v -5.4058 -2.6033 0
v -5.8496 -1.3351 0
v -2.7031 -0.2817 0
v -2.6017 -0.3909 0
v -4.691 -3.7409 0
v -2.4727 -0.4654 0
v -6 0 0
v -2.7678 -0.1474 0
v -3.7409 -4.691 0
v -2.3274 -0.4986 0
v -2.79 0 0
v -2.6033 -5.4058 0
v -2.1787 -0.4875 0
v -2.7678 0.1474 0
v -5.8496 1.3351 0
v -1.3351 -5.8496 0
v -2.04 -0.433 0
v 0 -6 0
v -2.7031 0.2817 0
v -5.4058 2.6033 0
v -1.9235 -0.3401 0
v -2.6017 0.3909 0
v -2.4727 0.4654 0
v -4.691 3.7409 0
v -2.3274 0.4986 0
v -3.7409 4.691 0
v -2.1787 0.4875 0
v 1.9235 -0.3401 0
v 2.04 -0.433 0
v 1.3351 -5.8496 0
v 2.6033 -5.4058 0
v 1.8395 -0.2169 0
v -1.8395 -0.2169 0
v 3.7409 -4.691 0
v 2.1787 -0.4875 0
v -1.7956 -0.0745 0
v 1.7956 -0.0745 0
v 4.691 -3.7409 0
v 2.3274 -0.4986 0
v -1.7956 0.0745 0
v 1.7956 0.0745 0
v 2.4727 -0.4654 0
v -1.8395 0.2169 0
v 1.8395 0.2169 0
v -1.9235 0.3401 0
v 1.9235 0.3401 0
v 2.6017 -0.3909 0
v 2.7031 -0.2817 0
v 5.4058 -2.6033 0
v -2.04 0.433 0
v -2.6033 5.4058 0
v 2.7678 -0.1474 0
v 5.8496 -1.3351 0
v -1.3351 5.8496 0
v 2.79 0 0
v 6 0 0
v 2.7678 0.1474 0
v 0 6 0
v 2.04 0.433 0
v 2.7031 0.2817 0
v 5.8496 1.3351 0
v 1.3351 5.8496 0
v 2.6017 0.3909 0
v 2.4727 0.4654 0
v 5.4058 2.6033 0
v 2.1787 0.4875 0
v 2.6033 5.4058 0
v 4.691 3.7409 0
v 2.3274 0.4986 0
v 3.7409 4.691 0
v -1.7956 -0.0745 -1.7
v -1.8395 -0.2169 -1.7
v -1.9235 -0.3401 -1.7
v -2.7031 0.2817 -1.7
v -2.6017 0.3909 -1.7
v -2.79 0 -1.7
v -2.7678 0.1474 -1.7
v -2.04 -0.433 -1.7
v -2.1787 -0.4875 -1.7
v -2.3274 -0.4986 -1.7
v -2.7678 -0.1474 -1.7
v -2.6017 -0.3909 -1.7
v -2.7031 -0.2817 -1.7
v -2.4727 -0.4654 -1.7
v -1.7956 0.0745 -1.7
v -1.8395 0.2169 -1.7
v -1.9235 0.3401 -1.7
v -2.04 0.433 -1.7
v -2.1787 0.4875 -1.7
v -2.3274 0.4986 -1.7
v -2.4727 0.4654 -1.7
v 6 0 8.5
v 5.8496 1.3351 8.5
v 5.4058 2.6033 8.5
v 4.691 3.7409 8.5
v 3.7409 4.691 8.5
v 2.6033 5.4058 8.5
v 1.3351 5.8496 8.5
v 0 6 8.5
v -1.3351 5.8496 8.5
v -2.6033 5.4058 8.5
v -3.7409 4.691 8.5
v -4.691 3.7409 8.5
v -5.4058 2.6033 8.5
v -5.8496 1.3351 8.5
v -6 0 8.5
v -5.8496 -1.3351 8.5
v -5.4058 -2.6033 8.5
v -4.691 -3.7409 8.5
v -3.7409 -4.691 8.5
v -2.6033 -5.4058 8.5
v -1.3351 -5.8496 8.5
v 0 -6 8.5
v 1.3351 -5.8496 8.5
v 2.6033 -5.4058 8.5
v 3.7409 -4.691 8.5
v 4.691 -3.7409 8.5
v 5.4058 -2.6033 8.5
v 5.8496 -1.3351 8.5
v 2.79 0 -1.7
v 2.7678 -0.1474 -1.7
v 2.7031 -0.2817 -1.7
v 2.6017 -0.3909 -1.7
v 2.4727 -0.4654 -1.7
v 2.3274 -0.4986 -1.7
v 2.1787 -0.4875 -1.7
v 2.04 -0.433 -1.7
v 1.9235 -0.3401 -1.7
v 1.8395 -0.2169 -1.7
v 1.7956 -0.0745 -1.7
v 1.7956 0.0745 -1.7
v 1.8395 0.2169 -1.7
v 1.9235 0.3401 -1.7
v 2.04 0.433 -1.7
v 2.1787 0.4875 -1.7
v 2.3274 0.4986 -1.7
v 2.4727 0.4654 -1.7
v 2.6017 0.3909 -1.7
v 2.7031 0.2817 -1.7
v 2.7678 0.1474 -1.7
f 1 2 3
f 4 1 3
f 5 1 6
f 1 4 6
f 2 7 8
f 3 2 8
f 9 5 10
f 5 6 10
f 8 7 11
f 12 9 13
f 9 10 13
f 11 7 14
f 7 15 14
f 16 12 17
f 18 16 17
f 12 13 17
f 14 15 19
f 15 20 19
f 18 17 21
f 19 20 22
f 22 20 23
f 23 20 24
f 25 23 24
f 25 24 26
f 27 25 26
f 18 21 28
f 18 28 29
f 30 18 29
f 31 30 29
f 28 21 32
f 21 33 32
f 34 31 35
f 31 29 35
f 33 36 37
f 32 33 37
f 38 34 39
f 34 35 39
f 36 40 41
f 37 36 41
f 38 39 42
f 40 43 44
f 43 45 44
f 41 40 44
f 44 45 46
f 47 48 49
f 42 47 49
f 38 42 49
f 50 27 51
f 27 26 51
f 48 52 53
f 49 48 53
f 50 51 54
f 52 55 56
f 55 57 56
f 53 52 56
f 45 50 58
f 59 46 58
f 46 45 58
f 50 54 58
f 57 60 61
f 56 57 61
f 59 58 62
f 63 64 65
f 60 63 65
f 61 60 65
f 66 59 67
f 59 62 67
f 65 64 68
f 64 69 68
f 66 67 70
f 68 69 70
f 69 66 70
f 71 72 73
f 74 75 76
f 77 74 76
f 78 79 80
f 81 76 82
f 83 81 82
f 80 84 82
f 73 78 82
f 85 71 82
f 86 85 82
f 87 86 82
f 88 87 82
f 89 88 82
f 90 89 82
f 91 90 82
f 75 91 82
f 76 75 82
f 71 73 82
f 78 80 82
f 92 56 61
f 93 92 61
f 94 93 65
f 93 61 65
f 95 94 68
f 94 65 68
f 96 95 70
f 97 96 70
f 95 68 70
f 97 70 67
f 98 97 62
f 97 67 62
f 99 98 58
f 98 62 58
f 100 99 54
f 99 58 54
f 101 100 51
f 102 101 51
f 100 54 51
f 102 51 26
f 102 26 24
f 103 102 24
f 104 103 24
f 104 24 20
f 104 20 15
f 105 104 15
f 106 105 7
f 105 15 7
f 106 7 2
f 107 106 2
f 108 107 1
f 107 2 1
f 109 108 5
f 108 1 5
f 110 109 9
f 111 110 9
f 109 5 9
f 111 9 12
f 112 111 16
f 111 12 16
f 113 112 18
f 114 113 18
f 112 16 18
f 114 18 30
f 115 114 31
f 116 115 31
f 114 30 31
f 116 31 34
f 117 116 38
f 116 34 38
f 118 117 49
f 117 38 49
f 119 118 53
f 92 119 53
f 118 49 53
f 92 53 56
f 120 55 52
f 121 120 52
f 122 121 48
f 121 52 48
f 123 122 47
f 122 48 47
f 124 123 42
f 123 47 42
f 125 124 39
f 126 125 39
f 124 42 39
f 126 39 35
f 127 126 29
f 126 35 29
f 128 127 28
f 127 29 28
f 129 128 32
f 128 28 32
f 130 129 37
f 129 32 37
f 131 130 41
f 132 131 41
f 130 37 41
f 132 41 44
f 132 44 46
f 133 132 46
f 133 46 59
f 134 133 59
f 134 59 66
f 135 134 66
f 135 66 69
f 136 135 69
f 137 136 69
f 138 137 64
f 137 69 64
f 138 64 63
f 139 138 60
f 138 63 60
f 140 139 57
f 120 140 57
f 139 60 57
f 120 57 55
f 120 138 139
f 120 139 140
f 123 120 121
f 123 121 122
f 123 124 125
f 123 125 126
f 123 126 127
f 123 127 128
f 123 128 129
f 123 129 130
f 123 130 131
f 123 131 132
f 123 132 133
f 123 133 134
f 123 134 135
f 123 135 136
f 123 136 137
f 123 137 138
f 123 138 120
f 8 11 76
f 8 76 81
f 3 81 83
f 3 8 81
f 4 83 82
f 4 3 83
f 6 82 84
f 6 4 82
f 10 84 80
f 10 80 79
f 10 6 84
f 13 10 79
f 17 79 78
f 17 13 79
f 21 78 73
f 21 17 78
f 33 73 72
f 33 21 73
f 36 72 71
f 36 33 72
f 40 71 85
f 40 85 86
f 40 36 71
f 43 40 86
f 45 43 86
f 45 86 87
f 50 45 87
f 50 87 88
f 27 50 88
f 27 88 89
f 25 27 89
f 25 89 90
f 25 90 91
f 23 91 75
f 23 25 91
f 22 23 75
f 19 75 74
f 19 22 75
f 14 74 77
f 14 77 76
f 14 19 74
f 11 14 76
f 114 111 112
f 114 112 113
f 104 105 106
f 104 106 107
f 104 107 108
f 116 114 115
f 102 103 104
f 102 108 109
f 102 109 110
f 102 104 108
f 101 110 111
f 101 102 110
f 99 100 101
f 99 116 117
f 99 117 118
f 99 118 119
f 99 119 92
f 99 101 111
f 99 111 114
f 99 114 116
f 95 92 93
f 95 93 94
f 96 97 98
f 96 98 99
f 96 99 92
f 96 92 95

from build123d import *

# Parameters (mm, degrees)
SKIZZE1_R                       = 6
COMPONENT_OUTLINE_DEPTH         = 8.5
SKIZZE2_R                       = 0.5
AUFSATZ_LINEAR_AUSTRAGEN1_DEPTH = 1.7


with BuildPart() as part:
    # Skizze1 → Component_Outline (new body)
    with BuildSketch(Plane.XY):
        Circle(SKIZZE1_R)
    extrude(amount=COMPONENT_OUTLINE_DEPTH)

    # Skizze2 → Aufsatz-Linear austragen1 (add)
    with BuildSketch(Plane(origin=(0, 0, 0), x_dir=(-1, 0, 0), z_dir=(0, 0, -1))):
        with Locations(Location((-2.29, 0, 0), (0, 0, 180))):
            Circle(SKIZZE2_R)
    aufsatz_linear_austragen1 = extrude(amount=AUFSATZ_LINEAR_AUSTRAGEN1_DEPTH)

    # Spiegeln1: Aufsatz-Linear austragen1 across plane
    add(aufsatz_linear_austragen1.mirror(Plane(origin=(0, 0, 0), x_dir=(0, 0, 1), z_dir=(1, 0, 0))))


solid = part.part
